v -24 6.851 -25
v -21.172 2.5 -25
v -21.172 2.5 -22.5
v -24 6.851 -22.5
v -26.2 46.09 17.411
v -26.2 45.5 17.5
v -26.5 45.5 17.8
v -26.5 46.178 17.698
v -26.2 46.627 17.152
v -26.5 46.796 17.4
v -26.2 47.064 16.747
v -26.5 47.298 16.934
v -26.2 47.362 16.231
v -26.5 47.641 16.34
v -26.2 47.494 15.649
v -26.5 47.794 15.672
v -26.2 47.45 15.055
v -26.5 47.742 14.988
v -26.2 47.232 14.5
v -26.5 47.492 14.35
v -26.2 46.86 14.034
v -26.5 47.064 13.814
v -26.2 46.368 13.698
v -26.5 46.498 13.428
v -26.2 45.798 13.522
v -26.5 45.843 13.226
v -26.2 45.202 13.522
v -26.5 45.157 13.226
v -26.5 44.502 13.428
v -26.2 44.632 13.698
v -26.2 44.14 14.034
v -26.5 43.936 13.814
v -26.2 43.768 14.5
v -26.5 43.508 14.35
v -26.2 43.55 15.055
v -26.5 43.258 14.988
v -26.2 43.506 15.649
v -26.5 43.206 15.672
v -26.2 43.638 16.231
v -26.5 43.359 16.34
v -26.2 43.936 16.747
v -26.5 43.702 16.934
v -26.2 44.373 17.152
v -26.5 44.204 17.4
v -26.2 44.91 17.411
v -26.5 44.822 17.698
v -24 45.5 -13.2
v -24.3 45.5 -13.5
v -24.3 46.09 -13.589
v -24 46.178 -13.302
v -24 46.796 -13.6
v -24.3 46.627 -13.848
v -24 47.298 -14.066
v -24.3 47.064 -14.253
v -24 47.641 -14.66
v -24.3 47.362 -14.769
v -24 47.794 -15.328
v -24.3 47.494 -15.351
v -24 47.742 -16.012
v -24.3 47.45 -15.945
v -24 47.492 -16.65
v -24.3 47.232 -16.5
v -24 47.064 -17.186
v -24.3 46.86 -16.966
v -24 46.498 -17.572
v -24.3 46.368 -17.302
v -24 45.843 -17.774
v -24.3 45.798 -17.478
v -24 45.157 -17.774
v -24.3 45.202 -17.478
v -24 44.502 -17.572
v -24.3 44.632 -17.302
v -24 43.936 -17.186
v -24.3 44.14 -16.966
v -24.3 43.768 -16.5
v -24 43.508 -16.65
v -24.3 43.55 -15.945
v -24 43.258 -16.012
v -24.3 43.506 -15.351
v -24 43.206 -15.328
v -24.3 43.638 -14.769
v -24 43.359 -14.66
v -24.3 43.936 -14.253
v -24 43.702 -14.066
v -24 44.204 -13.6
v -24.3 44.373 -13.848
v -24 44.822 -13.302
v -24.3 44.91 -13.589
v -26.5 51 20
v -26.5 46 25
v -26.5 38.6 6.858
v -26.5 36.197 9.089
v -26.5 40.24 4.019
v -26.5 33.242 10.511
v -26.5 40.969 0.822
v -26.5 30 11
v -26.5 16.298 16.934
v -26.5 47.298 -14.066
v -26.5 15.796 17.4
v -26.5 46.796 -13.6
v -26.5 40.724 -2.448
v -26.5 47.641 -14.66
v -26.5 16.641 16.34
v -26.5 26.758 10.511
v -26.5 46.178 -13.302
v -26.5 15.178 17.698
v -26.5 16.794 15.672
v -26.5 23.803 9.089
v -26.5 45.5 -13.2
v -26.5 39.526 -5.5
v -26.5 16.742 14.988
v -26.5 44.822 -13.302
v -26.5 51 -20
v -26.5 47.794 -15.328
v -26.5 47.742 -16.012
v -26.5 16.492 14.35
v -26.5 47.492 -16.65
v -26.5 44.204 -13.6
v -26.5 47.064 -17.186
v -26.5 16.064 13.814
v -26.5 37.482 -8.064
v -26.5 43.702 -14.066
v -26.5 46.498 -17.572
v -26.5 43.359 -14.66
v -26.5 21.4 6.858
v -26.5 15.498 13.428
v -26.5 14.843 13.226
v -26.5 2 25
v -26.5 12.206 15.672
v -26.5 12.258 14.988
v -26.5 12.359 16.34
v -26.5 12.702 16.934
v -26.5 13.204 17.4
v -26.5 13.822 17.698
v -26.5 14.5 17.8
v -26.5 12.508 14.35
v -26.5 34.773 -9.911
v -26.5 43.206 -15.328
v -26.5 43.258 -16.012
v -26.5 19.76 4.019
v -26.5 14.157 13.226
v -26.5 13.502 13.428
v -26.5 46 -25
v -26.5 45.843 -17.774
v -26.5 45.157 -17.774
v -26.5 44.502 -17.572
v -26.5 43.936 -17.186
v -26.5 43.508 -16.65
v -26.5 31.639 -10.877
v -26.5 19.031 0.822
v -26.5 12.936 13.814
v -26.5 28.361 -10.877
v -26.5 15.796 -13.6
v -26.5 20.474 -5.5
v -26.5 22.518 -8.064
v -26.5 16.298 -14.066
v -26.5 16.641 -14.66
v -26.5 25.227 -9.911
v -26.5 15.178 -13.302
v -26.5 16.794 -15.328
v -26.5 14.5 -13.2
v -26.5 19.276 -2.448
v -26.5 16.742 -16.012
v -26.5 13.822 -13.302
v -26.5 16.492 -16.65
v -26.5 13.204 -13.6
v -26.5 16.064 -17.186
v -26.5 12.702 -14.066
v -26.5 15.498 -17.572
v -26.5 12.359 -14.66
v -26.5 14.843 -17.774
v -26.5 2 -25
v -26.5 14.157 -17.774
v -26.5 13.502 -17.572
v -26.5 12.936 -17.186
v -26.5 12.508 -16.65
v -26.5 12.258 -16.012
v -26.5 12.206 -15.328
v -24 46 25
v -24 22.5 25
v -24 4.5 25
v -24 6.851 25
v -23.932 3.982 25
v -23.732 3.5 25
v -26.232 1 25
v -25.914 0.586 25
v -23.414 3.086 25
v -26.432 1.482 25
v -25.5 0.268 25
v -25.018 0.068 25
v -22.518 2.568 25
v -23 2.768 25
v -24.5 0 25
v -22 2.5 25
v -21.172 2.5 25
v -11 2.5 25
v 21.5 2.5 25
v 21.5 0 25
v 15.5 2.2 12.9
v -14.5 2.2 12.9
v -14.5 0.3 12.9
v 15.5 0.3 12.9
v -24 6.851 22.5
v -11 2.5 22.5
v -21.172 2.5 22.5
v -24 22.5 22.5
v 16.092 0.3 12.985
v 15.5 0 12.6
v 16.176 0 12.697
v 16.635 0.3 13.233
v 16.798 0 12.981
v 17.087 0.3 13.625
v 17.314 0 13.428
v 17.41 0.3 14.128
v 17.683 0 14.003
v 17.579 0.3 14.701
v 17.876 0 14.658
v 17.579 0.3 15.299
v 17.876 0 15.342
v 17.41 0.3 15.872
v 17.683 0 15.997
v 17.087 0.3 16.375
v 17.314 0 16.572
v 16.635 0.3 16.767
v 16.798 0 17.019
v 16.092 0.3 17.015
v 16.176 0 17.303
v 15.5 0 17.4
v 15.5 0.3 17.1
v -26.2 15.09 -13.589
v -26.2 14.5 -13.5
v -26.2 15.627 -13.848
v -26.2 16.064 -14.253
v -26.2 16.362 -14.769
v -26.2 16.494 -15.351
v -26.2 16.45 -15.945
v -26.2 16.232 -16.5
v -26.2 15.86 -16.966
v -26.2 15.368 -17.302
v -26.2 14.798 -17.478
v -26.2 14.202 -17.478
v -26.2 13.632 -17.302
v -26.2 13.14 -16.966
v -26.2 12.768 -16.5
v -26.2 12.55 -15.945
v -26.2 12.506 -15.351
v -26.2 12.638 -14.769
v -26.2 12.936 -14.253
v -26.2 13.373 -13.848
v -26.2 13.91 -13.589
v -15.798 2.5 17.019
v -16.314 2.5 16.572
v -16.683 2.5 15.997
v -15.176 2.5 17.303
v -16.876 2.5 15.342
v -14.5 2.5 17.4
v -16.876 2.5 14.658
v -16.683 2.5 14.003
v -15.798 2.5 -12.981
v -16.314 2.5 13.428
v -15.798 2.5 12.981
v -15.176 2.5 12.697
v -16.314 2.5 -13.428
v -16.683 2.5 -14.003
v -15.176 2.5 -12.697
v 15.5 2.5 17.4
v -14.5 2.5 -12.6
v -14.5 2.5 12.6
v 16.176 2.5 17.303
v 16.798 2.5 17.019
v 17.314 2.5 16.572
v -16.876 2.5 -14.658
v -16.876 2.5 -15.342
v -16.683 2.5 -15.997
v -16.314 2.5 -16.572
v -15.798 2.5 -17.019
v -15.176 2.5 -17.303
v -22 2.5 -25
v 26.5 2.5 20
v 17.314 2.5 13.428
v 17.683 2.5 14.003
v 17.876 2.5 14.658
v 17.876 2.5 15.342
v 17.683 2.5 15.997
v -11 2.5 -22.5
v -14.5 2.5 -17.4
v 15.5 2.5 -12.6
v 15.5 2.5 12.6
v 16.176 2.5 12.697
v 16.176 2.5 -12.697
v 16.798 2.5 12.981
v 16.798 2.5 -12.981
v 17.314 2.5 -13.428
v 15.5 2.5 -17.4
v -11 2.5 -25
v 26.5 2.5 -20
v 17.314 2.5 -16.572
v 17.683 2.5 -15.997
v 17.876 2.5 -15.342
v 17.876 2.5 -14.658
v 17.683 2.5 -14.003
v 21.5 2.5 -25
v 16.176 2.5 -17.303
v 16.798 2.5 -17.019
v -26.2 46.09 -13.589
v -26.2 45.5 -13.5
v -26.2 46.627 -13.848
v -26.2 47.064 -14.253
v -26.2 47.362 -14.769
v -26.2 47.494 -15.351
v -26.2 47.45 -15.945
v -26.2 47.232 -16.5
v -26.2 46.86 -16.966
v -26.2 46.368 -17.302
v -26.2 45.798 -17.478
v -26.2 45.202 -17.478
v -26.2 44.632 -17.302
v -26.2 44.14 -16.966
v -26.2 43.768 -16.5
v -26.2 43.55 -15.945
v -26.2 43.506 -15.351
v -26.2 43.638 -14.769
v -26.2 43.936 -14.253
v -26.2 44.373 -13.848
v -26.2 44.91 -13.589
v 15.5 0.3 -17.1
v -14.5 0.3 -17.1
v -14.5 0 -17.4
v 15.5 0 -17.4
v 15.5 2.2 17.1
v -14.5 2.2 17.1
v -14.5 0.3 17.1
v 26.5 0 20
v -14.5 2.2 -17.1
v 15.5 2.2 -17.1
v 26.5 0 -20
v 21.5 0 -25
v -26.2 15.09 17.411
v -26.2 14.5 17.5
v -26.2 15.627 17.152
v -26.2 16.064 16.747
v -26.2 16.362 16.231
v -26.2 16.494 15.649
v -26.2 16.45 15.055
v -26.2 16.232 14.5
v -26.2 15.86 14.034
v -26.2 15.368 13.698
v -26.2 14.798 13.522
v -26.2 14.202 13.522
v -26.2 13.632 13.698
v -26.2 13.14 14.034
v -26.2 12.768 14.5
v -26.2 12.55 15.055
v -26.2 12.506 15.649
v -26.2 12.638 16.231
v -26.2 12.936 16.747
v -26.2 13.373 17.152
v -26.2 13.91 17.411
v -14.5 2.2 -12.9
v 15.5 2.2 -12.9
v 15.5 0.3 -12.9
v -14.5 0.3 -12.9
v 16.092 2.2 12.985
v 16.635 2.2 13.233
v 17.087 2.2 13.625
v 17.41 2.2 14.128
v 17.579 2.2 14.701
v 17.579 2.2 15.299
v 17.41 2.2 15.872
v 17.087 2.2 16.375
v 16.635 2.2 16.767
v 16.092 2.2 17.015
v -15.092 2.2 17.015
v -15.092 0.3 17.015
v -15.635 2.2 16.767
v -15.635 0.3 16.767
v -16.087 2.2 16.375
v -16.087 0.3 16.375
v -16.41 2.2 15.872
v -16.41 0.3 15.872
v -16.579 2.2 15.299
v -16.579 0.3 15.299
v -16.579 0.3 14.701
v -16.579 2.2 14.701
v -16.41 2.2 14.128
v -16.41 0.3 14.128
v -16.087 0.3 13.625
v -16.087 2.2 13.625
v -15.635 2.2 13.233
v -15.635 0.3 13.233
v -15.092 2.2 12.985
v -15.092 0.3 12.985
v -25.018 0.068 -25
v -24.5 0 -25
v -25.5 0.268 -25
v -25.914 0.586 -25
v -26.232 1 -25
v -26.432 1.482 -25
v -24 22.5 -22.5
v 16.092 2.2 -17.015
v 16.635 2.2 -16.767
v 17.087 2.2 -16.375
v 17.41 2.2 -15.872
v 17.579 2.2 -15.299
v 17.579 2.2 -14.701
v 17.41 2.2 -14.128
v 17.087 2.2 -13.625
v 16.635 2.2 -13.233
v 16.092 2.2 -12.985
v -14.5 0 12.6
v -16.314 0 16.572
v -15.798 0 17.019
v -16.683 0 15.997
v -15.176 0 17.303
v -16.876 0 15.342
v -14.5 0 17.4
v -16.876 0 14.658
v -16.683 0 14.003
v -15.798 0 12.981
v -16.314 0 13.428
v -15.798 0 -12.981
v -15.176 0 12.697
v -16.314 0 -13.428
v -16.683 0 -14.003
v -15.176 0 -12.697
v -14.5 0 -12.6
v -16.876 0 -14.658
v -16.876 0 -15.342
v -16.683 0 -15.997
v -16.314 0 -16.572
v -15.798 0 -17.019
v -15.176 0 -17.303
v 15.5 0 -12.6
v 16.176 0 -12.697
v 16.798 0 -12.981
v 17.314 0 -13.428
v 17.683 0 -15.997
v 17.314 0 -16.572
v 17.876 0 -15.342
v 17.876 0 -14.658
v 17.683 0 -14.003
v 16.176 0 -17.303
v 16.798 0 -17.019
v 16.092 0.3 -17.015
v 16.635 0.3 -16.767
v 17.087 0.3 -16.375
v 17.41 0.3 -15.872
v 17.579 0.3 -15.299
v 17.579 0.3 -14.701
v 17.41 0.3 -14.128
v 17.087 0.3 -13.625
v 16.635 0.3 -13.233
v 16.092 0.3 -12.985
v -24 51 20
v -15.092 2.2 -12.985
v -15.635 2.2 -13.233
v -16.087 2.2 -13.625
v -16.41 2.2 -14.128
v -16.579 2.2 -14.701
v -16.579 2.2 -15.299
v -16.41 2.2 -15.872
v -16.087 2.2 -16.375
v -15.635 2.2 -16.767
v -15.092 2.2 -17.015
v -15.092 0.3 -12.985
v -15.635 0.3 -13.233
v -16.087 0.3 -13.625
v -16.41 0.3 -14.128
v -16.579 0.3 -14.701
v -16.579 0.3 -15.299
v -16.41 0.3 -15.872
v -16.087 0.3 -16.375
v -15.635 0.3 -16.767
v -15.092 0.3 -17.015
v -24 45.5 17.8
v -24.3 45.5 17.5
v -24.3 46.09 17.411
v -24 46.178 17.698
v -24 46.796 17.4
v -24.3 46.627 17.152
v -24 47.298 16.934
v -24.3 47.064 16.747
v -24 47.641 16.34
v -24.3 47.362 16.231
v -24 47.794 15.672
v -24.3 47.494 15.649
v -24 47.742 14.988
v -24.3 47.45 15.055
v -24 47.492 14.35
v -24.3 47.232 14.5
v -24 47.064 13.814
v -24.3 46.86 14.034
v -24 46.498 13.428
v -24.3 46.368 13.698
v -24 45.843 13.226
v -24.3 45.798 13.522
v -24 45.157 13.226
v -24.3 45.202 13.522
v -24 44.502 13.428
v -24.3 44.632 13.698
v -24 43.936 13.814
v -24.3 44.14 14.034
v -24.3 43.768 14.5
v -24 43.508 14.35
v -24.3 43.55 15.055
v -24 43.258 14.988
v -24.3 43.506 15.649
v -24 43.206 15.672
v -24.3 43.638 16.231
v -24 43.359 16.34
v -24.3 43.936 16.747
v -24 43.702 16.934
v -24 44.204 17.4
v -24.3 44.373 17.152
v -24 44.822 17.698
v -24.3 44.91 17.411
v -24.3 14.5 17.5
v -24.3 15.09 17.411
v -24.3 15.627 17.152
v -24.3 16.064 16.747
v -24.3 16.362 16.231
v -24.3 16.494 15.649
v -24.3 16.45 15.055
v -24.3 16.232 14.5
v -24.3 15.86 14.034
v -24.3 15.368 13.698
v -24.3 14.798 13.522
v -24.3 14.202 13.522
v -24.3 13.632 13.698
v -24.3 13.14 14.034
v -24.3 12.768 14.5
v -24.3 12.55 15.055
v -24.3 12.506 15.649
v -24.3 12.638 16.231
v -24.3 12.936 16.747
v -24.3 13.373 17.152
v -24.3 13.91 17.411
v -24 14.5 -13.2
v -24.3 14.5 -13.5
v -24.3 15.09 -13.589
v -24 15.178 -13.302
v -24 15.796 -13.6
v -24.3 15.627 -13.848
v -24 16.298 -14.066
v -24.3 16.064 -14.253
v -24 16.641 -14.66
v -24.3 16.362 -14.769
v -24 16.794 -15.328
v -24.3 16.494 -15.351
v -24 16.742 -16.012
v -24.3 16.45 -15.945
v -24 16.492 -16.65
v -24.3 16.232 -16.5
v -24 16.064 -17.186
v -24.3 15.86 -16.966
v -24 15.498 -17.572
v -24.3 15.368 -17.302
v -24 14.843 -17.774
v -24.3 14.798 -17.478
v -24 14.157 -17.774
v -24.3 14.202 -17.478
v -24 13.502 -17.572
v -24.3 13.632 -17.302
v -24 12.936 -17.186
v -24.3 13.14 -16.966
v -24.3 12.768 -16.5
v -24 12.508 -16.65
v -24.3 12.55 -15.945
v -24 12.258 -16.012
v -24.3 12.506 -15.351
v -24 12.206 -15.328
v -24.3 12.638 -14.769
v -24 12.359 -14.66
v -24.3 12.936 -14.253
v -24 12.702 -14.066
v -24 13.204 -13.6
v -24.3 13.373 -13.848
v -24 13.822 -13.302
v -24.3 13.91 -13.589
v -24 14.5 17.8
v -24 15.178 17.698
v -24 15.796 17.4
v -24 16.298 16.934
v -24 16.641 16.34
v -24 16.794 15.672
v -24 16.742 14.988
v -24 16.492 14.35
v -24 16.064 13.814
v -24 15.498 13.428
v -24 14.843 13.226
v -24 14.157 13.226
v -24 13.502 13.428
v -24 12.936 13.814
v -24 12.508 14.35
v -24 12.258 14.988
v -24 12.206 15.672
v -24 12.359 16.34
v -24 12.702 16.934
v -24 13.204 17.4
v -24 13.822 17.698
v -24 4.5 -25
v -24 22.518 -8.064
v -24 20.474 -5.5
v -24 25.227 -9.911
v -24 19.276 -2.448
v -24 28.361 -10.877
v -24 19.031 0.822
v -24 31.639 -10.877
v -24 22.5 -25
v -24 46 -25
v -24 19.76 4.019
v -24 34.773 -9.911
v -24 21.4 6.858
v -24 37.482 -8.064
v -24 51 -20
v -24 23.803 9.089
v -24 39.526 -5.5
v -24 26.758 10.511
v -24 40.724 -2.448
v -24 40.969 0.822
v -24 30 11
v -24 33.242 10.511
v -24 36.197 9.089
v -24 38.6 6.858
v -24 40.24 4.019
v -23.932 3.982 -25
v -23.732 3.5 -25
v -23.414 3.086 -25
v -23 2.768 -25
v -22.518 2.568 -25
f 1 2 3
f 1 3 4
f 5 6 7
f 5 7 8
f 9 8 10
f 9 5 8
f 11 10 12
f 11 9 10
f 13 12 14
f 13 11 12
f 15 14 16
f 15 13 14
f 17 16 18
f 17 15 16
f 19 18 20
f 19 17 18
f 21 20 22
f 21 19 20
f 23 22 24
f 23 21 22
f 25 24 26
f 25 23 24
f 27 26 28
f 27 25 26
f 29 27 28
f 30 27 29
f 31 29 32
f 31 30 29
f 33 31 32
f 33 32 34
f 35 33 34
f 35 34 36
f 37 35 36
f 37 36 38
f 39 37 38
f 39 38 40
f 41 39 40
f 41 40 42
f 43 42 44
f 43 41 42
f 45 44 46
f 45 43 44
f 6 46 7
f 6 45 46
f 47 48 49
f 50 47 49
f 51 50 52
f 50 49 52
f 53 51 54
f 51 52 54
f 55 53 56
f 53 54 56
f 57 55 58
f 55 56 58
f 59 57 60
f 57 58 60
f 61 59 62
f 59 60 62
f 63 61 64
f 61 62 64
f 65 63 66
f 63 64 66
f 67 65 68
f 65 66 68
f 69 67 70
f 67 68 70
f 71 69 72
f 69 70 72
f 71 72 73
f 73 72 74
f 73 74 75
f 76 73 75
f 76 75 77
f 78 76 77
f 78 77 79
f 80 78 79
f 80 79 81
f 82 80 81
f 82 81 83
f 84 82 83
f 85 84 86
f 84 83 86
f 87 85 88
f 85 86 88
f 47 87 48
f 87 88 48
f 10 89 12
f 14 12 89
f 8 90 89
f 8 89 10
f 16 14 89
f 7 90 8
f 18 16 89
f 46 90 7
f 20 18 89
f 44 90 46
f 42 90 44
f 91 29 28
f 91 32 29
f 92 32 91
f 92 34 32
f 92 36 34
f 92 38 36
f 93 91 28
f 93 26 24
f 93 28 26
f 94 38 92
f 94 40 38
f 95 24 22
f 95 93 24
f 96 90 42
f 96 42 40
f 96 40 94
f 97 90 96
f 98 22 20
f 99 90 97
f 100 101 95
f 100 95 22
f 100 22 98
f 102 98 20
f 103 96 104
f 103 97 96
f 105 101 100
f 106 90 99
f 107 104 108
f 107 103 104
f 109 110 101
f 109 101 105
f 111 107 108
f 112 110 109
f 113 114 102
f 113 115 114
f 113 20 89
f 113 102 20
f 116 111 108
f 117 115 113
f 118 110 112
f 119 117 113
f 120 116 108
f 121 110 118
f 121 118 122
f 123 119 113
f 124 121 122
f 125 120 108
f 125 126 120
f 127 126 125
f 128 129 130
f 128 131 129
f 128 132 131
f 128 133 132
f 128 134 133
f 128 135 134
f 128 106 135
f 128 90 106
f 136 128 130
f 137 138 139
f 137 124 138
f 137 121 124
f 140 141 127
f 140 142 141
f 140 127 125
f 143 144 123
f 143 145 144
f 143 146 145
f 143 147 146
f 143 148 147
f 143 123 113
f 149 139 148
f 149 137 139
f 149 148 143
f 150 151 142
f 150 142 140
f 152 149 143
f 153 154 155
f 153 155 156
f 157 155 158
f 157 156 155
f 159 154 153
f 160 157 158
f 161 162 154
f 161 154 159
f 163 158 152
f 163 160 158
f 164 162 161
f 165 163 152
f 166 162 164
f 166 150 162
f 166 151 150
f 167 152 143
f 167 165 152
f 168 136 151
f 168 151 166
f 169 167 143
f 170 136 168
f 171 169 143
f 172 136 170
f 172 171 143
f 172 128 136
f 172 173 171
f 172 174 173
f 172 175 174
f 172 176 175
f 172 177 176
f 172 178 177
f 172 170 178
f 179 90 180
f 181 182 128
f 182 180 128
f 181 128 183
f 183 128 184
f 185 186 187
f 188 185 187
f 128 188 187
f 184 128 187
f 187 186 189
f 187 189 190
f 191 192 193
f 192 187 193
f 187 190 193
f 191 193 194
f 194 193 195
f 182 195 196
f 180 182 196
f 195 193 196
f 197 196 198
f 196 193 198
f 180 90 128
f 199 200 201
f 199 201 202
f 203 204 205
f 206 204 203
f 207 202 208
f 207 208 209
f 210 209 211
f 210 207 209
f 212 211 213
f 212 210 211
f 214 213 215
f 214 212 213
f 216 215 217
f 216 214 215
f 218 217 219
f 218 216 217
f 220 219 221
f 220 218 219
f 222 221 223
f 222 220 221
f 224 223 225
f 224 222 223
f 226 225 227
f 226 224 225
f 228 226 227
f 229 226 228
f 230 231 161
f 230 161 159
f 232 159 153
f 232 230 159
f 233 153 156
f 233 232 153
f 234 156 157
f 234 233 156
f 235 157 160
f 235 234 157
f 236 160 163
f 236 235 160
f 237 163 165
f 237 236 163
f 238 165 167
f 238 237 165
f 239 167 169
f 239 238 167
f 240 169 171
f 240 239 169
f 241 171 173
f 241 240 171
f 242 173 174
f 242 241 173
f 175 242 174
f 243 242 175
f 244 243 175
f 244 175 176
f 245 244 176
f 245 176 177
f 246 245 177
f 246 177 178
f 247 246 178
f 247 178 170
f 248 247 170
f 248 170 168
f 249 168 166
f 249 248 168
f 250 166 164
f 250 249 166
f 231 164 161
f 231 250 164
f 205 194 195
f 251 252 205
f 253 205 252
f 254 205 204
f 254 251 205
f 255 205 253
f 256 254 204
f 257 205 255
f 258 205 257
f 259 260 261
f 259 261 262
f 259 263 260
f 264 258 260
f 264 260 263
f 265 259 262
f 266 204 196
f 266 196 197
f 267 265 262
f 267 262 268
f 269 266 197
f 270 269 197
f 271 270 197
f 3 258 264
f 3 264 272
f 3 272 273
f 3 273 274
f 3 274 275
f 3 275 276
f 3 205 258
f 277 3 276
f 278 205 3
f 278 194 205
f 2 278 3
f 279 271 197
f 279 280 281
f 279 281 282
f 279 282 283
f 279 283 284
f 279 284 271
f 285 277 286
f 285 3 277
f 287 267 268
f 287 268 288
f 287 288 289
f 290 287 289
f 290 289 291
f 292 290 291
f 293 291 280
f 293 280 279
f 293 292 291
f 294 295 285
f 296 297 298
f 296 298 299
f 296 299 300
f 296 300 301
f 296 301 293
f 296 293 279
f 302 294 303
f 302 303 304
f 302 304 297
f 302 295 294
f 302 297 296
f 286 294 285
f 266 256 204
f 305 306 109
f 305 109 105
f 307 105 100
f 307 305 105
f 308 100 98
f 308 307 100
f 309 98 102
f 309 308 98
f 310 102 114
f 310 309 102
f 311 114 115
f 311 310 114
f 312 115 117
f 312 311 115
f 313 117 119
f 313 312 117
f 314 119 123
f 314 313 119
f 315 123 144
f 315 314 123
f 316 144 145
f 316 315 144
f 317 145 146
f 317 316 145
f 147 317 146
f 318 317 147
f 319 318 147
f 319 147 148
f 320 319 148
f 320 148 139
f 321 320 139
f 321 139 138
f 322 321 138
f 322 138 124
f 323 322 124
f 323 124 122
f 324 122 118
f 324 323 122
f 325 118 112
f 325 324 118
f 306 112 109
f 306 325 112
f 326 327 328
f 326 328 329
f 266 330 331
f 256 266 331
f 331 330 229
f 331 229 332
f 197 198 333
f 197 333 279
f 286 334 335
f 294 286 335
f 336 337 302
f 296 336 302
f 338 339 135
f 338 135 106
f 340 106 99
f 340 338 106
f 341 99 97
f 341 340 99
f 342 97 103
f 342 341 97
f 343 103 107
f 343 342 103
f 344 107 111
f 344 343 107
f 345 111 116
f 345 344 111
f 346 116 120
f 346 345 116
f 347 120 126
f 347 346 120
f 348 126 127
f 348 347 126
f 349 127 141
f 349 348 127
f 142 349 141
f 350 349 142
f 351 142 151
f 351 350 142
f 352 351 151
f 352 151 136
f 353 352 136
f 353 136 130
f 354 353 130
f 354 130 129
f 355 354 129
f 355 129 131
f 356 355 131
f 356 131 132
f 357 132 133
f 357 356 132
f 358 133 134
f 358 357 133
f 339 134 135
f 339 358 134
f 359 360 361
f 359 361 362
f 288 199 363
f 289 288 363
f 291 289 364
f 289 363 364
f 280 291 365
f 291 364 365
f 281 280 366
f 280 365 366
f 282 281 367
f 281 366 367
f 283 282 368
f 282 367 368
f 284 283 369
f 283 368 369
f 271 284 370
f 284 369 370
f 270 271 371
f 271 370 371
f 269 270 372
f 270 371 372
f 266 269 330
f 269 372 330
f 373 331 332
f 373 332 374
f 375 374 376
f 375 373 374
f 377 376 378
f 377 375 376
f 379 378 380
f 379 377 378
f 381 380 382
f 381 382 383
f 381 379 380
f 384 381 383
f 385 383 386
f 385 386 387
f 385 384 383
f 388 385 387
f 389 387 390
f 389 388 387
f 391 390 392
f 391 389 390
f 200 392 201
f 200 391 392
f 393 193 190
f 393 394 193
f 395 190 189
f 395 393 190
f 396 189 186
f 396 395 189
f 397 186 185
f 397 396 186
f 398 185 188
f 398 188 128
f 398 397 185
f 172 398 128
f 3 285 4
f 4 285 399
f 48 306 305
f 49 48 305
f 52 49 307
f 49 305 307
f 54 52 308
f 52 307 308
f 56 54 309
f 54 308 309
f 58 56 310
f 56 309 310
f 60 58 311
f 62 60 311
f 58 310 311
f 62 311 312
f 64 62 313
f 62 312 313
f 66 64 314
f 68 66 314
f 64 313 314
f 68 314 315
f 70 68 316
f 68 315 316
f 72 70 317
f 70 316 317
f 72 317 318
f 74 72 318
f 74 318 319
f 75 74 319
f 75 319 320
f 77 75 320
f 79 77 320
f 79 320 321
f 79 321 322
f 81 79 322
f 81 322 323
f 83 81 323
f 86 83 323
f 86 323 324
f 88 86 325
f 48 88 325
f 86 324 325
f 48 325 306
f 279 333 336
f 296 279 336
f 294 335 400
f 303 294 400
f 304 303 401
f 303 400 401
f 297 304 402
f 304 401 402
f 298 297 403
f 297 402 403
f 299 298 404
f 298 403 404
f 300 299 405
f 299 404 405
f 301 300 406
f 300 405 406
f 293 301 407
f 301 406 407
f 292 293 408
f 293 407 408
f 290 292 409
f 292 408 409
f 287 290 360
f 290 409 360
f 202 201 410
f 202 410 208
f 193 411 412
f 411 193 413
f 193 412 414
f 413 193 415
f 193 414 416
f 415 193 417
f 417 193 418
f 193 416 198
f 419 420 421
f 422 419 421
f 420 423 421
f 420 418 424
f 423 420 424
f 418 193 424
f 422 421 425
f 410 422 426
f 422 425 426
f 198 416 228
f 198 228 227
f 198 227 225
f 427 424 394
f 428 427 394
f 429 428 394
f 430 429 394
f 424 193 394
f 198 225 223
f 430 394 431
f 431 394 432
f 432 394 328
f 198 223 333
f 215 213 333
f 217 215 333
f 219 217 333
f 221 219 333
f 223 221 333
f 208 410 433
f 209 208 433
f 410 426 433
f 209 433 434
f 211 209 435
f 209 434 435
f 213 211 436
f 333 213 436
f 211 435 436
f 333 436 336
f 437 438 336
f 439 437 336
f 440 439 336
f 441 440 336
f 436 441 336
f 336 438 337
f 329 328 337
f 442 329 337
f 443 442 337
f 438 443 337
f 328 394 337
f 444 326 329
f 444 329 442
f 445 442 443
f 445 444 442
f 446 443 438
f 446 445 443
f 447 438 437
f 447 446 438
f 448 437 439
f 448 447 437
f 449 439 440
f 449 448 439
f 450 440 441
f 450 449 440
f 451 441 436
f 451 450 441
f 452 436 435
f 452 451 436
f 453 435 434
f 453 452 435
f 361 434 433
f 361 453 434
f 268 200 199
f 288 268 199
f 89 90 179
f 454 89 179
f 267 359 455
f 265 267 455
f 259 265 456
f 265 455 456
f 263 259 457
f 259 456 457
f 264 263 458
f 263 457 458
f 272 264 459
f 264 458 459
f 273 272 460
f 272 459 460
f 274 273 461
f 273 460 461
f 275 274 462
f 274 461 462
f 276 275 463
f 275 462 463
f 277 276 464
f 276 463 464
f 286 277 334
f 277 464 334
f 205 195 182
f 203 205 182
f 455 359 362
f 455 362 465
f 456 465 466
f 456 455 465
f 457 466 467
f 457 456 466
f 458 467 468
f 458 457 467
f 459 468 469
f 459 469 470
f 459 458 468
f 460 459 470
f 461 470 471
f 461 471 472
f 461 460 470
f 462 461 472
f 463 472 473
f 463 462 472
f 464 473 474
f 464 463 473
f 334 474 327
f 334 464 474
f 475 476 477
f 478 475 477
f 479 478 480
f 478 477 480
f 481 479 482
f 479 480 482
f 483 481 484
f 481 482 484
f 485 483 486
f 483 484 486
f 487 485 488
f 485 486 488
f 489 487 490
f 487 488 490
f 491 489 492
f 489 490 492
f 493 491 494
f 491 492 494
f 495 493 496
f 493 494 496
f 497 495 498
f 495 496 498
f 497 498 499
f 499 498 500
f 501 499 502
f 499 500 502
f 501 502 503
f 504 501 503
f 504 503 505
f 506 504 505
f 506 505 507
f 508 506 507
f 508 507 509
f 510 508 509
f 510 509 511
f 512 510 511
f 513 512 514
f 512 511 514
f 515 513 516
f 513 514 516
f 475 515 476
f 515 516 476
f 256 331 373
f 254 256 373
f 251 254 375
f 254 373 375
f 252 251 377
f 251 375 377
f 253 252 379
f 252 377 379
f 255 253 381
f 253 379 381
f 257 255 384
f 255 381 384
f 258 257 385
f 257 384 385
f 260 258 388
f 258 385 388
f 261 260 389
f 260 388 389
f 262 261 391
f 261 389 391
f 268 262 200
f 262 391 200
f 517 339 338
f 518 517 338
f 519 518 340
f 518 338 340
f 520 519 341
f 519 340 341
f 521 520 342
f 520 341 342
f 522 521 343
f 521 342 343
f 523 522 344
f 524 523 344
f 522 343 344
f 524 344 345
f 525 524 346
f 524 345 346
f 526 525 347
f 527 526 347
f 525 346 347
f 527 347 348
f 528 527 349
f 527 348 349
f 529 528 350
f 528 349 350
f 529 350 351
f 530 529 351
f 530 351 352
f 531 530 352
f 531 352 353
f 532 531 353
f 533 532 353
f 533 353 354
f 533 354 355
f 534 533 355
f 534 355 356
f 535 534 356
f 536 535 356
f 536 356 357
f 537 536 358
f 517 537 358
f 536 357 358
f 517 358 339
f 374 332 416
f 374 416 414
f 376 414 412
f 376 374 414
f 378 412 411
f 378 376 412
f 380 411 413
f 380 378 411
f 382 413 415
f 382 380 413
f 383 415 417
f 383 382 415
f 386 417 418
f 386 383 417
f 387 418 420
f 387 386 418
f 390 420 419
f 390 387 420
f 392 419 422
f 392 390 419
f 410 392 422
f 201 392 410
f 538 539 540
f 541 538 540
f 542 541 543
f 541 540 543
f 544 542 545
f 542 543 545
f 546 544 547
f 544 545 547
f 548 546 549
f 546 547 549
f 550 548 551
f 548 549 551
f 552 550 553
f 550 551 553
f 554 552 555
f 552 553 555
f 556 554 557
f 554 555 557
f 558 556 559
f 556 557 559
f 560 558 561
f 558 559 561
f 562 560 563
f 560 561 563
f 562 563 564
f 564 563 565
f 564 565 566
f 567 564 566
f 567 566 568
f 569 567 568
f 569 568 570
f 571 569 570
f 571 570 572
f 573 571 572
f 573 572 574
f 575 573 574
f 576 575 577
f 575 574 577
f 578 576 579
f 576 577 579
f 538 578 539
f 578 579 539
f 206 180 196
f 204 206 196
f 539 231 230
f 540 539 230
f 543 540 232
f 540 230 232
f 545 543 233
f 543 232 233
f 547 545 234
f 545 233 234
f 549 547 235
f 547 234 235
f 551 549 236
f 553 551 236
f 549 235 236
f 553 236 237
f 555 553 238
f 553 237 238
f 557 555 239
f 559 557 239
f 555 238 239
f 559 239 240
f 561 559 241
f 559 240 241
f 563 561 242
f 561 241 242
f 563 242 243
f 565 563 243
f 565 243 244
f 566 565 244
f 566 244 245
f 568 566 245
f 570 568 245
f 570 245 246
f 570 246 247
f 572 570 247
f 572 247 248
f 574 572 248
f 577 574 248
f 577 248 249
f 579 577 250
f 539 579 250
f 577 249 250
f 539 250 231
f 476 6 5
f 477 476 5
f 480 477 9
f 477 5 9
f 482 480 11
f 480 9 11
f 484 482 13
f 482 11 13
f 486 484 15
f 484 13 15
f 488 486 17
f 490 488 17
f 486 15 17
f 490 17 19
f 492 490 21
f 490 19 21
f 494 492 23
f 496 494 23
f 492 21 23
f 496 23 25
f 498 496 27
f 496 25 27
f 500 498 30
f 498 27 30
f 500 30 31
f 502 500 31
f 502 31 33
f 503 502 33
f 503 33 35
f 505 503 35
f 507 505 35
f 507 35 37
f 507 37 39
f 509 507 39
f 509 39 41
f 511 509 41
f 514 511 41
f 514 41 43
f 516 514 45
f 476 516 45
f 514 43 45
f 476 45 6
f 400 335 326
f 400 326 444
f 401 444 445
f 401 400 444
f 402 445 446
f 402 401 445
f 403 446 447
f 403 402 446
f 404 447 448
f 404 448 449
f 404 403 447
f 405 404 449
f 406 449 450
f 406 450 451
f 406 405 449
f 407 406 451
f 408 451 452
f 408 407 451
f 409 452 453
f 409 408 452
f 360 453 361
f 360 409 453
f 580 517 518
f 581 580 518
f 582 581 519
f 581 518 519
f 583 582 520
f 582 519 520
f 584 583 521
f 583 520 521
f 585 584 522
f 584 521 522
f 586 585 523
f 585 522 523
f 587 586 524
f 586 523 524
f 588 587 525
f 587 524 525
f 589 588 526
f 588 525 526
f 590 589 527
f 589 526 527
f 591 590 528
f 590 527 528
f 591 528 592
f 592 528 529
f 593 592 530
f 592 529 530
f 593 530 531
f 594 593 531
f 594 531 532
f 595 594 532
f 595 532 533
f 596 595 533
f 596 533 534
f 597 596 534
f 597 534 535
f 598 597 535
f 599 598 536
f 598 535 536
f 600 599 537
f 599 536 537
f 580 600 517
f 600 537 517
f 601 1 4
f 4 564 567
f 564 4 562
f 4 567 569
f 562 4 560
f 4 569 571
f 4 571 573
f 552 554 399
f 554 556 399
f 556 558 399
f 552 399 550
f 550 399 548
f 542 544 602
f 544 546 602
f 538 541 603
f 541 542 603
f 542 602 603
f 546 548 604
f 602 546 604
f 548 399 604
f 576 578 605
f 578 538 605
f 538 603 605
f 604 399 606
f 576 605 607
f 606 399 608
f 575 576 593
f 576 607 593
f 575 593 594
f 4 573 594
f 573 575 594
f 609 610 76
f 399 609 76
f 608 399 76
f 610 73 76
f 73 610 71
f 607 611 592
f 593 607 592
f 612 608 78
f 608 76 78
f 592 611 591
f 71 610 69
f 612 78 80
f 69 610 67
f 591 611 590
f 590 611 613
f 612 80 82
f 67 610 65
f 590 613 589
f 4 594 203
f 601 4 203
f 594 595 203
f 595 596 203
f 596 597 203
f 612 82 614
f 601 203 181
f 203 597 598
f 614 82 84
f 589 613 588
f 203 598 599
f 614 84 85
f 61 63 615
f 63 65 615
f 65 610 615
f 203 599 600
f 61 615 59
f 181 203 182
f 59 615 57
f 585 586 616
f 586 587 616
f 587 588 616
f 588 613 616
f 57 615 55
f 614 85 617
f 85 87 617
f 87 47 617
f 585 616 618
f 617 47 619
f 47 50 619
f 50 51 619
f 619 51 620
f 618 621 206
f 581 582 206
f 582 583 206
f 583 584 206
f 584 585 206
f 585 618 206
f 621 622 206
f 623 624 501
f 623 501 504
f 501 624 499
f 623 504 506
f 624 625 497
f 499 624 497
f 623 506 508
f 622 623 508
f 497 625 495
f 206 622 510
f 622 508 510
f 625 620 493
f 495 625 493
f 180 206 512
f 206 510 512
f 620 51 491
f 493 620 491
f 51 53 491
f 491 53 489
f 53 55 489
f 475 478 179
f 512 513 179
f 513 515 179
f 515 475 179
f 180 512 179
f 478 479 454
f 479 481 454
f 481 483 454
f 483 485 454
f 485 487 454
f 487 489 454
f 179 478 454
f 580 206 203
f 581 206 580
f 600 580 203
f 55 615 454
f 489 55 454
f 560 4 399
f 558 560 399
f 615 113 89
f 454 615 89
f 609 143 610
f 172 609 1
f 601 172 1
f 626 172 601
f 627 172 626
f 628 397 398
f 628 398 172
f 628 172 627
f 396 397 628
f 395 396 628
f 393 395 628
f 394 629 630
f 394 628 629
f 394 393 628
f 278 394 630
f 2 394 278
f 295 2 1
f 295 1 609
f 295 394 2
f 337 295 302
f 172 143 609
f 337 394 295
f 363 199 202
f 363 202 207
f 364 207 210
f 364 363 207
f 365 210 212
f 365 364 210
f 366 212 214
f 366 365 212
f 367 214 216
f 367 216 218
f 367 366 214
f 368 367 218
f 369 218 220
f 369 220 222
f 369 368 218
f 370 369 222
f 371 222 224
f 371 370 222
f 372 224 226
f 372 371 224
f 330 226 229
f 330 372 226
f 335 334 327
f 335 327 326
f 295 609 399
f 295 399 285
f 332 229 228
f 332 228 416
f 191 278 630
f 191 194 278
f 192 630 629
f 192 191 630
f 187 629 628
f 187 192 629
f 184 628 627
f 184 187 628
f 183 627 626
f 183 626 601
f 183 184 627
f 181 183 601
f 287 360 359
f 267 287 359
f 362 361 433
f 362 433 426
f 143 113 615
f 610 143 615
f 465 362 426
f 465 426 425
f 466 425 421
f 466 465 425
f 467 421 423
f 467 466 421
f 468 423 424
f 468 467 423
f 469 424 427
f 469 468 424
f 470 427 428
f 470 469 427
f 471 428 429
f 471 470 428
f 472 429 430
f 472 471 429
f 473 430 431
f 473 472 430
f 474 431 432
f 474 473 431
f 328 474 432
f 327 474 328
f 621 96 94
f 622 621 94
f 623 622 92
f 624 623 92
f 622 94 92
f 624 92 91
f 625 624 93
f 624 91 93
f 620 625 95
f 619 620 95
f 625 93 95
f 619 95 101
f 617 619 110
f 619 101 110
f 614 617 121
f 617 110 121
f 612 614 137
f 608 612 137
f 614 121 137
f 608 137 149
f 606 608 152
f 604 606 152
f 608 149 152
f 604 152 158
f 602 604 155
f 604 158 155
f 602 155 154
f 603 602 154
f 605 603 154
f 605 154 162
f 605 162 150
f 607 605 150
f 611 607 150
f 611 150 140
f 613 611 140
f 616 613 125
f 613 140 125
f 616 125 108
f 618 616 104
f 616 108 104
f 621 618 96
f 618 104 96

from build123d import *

# Parameters (mm, degrees)
SKETCH1_W           = 53
SKETCH1_H           = 50
BOSS_EXTRUDE1_DEPTH = 2.5
SKETCH2_W           = 50
SKETCH2_H           = 51
BOSS_EXTRUDE2_DEPTH = 2.5
CHAMFER1_SIZE       = 5
SKETCH3_R           = 11
SKETCH3_R_2         = 2
CUT_EXTRUDE1_DEPTH  = 2.5
CUT_EXTRUDE2_DEPTH  = 2.5
FILLET1_R           = 2
FILLET2_R           = 2
CHAMFER2_SIZE       = 0.3
CHAMFER3_SIZE       = 0.3
BOSS_EXTRUDE3_DEPTH = 2.5
BOSS_EXTRUDE4_DEPTH = 2.5


with BuildPart() as part:
    # Sketch1 → Boss-Extrude1 (new body)
    with BuildSketch(Plane(origin=(0, 0, 0), x_dir=(1, 0, 0), z_dir=(0, 1, 0))):
        Rectangle(SKETCH1_W, SKETCH1_H)
    extrude(amount=BOSS_EXTRUDE1_DEPTH)

    # Sketch2 → Boss-Extrude2 (add)
    with BuildSketch(Plane.ZY.offset(26.5)):
        with Locations((0, 25.5)):
            Rectangle(SKETCH2_W, SKETCH2_H)
    extrude(amount=-BOSS_EXTRUDE2_DEPTH)

    # Chamfer1
    chamfer1_edges = [part.edges().sort_by_distance(p)[0] for p in [
        (-25.25, 51, 25),
        (-25.25, 51, -25),
        (26.5, 1.25, 25),
        (26.5, 1.25, -25),
    ]]
    chamfer(chamfer1_edges, length=CHAMFER1_SIZE)

    # Sketch3 → Cut-Extrude1 (cut)
    with BuildSketch(Plane.ZY.offset(26.5)):
        with Locations((0, 30)):
            Circle(SKETCH3_R)
        with Locations((-15.5, 45.5)):
            Circle(SKETCH3_R_2)
        with Locations((15.5, 45.5)):
            Circle(SKETCH3_R_2)
        with Locations((-15.5, 14.5)):
            Circle(SKETCH3_R_2)
        with Locations((15.5, 14.5)):
            Circle(SKETCH3_R_2)
    extrude(amount=-CUT_EXTRUDE1_DEPTH, mode=Mode.SUBTRACT)

    # Sketch4 → Cut-Extrude2 (cut)
    with BuildSketch(Plane(origin=(0, 2.5, 0), x_dir=(1, 0, 0), z_dir=(0, 1, 0))):
        with BuildLine():
            Line((-14.5, 17.1), (15.5, 17.1))
            ThreePointArc((15.5, 17.1), (17.6, 15), (15.5, 12.9))
            Line((15.5, 12.9), (-14.5, 12.9))
            ThreePointArc((-14.5, 12.9), (-16.6, 15), (-14.5, 17.1))
        make_face()
        with BuildLine():
            Line((-14.5, -12.9), (15.5, -12.9))
            ThreePointArc((15.5, -12.9), (17.6, -15), (15.5, -17.1))
            Line((15.5, -17.1), (-14.5, -17.1))
            ThreePointArc((-14.5, -17.1), (-16.6, -15), (-14.5, -12.9))
        make_face()
    extrude(amount=-CUT_EXTRUDE2_DEPTH, mode=Mode.SUBTRACT)

    # Fillet1
    fillet1_edges = [part.edges().sort_by_distance(p)[0] for p in [
        (-24, 2.5, 0),
    ]]
    fillet(fillet1_edges, radius=FILLET1_R)

    # Fillet2
    fillet2_edges = [part.edges().sort_by_distance(p)[0] for p in [
        (-26.5, 0, 0),
    ]]
    fillet(fillet2_edges, radius=FILLET2_R)

    # Chamfer2
    chamfer2_edges = [part.edges().sort_by_distance(p)[0] for p in [
        (-24, 45.5, -17.5),
        (-26.5, 45.5, -17.5),
        (-24, 45.5, 13.5),
        (-26.5, 45.5, 13.5),
        (-24, 14.5, -17.5),
        (-26.5, 14.5, -17.5),
        (-24, 14.5, 13.5),
        (-26.5, 14.5, 13.5),
    ]]
    chamfer(chamfer2_edges, length=CHAMFER2_SIZE)

    # Chamfer3
    chamfer3_edges = [part.edges().sort_by_distance(p)[0] for p in [
        (-16.6, 0, 15),
        (0.5, 2.5, 12.9),
        (17.6, 0, 15),
        (0.5, 0, 17.1),
        (0.5, 0, 12.9),
        (-16.6, 2.5, 15),
        (0.5, 2.5, 17.1),
        (17.6, 2.5, 15),
        (-16.6, 0, -15),
        (0.5, 2.5, -17.1),
        (17.6, 0, -15),
        (0.5, 0, -12.9),
        (0.5, 0, -17.1),
        (-16.6, 2.5, -15),
        (0.5, 2.5, -12.9),
        (17.6, 2.5, -15),
    ]]
    chamfer(chamfer3_edges, length=CHAMFER3_SIZE)

    # Sketch5 → Boss-Extrude3 (add)
    with BuildSketch(Plane.XY.offset(25)):
        Polygon((-24, 22.5), (-11, 2.5), (-21.171930363, 2.5), (-24, 6.850876365), align=None)
    extrude(amount=-BOSS_EXTRUDE3_DEPTH)

    # Sketch6 → Boss-Extrude4 (add)
    with BuildSketch(Plane(origin=(0, 0, -25), x_dir=(-1, 0, 0), z_dir=(0, 0, -1))):
        Polygon((24, 22.5), (11, 2.5), (21.171930363, 2.5), (24, 6.850876365), align=None)
    extrude(amount=-BOSS_EXTRUDE4_DEPTH)


solid = part.part
